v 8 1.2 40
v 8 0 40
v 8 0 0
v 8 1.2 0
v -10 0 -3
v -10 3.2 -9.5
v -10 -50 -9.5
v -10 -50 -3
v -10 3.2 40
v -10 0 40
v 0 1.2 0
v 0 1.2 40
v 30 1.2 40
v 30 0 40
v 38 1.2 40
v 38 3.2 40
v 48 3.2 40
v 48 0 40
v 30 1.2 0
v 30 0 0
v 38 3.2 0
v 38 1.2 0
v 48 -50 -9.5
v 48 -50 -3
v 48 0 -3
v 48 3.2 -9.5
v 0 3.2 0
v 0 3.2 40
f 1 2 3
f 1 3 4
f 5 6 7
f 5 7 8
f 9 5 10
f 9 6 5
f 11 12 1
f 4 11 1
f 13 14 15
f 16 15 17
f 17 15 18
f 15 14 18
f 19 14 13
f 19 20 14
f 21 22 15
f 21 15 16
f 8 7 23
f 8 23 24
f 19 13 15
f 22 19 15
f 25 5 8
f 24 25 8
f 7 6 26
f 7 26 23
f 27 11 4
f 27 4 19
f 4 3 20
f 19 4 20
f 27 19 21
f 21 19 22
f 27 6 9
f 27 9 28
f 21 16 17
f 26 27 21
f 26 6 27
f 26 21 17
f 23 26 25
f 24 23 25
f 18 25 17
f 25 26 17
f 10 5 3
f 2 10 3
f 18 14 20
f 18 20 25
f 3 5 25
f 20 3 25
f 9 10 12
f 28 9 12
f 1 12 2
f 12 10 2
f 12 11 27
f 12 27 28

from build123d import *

# Parameters (mm, degrees)
F0_W      = 38
F0_H      = 1.2
F1_DEPTH  = 20
F3_W      = 10
F3_H      = 20
F4_DEPTH  = 3.2
F5_W      = 10
F5_H      = 20
F6_DEPTH  = 3.2
F7_W      = 38
F7_H      = 2
F8_DEPTH  = 10
F2_W      = 22
F2_H      = 1.2
F9_DEPTH  = 20
F10_W     = 18
F10_H     = 7
F11_DEPTH = 50
F12_DEPTH = 20
F13_DEPTH = 40
F14_DEPTH = 0.5


with BuildPart() as f1:
    # F0 (on Top) → F1 (new body)
    with BuildSketch(Plane.XY):
        with Locations((19, 0.6)):
            Rectangle(F0_W, F0_H)
    extrude(amount=F1_DEPTH)

    # F3 (on face) → F4 (join)
    with BuildSketch(Plane.XZ):
        with Locations((-5, 10)):
            Rectangle(F3_W, F3_H)
    extrude(amount=-F4_DEPTH)

    # F5 (on face) → F6 (join)
    with BuildSketch(Plane.XZ):
        with Locations((43, 10)):
            Rectangle(F5_W, F5_H)
    extrude(amount=-F6_DEPTH)

    # F7 (on face) → F8 (join)
    with BuildSketch(Plane(origin=(0, 0, 0), x_dir=(1, 0, 0), z_dir=(0, 0, -1))):
        with Locations((19, -2.2)):
            Rectangle(F7_W, F7_H)
        Polygon((48, -3.2), (48, 0), (-10, 0), (-10, -3.2), (0, -3.2), (0, -1.2), (38, -1.2), (38, -3.2), align=None)
    extrude(amount=F8_DEPTH)

    # F2 (on face) → F9 (cut)
    with BuildSketch(Plane.XY.offset(20)):
        with Locations((19, 0.6)):
            Rectangle(F2_W, F2_H)
    extrude(amount=-F9_DEPTH, mode=Mode.SUBTRACT)

    # F10 (on face) → F11 (join)
    with BuildSketch(Plane.XZ):
        with Locations((-1, -6.5)):
            Rectangle(F10_W, F10_H)
    extrude(amount=F11_DEPTH)

    # F12 (add): faces of the model
    f12_faces = [f1.faces().sort_by_distance(p)[0] for p in [
        (40.9230769231, 1.3692307692, 20),
        (-2.9230769231, 1.3692307692, 20),
    ]]
    extrude(f12_faces, amount=F12_DEPTH)

    # F13 (add): a face of the model
    f13_faces = [f1.faces().sort_by_distance(p)[0] for p in [
        (8, -25, -6.5),
    ]]
    extrude(f13_faces, amount=F13_DEPTH)

    # F14 (cut): a face of the model
    f14_faces = [f1.faces().sort_by_distance(p)[0] for p in [
        (19, -23.4, -10),
    ]]
    extrude(f14_faces, amount=-F14_DEPTH, mode=Mode.SUBTRACT)


solid = f1.part
